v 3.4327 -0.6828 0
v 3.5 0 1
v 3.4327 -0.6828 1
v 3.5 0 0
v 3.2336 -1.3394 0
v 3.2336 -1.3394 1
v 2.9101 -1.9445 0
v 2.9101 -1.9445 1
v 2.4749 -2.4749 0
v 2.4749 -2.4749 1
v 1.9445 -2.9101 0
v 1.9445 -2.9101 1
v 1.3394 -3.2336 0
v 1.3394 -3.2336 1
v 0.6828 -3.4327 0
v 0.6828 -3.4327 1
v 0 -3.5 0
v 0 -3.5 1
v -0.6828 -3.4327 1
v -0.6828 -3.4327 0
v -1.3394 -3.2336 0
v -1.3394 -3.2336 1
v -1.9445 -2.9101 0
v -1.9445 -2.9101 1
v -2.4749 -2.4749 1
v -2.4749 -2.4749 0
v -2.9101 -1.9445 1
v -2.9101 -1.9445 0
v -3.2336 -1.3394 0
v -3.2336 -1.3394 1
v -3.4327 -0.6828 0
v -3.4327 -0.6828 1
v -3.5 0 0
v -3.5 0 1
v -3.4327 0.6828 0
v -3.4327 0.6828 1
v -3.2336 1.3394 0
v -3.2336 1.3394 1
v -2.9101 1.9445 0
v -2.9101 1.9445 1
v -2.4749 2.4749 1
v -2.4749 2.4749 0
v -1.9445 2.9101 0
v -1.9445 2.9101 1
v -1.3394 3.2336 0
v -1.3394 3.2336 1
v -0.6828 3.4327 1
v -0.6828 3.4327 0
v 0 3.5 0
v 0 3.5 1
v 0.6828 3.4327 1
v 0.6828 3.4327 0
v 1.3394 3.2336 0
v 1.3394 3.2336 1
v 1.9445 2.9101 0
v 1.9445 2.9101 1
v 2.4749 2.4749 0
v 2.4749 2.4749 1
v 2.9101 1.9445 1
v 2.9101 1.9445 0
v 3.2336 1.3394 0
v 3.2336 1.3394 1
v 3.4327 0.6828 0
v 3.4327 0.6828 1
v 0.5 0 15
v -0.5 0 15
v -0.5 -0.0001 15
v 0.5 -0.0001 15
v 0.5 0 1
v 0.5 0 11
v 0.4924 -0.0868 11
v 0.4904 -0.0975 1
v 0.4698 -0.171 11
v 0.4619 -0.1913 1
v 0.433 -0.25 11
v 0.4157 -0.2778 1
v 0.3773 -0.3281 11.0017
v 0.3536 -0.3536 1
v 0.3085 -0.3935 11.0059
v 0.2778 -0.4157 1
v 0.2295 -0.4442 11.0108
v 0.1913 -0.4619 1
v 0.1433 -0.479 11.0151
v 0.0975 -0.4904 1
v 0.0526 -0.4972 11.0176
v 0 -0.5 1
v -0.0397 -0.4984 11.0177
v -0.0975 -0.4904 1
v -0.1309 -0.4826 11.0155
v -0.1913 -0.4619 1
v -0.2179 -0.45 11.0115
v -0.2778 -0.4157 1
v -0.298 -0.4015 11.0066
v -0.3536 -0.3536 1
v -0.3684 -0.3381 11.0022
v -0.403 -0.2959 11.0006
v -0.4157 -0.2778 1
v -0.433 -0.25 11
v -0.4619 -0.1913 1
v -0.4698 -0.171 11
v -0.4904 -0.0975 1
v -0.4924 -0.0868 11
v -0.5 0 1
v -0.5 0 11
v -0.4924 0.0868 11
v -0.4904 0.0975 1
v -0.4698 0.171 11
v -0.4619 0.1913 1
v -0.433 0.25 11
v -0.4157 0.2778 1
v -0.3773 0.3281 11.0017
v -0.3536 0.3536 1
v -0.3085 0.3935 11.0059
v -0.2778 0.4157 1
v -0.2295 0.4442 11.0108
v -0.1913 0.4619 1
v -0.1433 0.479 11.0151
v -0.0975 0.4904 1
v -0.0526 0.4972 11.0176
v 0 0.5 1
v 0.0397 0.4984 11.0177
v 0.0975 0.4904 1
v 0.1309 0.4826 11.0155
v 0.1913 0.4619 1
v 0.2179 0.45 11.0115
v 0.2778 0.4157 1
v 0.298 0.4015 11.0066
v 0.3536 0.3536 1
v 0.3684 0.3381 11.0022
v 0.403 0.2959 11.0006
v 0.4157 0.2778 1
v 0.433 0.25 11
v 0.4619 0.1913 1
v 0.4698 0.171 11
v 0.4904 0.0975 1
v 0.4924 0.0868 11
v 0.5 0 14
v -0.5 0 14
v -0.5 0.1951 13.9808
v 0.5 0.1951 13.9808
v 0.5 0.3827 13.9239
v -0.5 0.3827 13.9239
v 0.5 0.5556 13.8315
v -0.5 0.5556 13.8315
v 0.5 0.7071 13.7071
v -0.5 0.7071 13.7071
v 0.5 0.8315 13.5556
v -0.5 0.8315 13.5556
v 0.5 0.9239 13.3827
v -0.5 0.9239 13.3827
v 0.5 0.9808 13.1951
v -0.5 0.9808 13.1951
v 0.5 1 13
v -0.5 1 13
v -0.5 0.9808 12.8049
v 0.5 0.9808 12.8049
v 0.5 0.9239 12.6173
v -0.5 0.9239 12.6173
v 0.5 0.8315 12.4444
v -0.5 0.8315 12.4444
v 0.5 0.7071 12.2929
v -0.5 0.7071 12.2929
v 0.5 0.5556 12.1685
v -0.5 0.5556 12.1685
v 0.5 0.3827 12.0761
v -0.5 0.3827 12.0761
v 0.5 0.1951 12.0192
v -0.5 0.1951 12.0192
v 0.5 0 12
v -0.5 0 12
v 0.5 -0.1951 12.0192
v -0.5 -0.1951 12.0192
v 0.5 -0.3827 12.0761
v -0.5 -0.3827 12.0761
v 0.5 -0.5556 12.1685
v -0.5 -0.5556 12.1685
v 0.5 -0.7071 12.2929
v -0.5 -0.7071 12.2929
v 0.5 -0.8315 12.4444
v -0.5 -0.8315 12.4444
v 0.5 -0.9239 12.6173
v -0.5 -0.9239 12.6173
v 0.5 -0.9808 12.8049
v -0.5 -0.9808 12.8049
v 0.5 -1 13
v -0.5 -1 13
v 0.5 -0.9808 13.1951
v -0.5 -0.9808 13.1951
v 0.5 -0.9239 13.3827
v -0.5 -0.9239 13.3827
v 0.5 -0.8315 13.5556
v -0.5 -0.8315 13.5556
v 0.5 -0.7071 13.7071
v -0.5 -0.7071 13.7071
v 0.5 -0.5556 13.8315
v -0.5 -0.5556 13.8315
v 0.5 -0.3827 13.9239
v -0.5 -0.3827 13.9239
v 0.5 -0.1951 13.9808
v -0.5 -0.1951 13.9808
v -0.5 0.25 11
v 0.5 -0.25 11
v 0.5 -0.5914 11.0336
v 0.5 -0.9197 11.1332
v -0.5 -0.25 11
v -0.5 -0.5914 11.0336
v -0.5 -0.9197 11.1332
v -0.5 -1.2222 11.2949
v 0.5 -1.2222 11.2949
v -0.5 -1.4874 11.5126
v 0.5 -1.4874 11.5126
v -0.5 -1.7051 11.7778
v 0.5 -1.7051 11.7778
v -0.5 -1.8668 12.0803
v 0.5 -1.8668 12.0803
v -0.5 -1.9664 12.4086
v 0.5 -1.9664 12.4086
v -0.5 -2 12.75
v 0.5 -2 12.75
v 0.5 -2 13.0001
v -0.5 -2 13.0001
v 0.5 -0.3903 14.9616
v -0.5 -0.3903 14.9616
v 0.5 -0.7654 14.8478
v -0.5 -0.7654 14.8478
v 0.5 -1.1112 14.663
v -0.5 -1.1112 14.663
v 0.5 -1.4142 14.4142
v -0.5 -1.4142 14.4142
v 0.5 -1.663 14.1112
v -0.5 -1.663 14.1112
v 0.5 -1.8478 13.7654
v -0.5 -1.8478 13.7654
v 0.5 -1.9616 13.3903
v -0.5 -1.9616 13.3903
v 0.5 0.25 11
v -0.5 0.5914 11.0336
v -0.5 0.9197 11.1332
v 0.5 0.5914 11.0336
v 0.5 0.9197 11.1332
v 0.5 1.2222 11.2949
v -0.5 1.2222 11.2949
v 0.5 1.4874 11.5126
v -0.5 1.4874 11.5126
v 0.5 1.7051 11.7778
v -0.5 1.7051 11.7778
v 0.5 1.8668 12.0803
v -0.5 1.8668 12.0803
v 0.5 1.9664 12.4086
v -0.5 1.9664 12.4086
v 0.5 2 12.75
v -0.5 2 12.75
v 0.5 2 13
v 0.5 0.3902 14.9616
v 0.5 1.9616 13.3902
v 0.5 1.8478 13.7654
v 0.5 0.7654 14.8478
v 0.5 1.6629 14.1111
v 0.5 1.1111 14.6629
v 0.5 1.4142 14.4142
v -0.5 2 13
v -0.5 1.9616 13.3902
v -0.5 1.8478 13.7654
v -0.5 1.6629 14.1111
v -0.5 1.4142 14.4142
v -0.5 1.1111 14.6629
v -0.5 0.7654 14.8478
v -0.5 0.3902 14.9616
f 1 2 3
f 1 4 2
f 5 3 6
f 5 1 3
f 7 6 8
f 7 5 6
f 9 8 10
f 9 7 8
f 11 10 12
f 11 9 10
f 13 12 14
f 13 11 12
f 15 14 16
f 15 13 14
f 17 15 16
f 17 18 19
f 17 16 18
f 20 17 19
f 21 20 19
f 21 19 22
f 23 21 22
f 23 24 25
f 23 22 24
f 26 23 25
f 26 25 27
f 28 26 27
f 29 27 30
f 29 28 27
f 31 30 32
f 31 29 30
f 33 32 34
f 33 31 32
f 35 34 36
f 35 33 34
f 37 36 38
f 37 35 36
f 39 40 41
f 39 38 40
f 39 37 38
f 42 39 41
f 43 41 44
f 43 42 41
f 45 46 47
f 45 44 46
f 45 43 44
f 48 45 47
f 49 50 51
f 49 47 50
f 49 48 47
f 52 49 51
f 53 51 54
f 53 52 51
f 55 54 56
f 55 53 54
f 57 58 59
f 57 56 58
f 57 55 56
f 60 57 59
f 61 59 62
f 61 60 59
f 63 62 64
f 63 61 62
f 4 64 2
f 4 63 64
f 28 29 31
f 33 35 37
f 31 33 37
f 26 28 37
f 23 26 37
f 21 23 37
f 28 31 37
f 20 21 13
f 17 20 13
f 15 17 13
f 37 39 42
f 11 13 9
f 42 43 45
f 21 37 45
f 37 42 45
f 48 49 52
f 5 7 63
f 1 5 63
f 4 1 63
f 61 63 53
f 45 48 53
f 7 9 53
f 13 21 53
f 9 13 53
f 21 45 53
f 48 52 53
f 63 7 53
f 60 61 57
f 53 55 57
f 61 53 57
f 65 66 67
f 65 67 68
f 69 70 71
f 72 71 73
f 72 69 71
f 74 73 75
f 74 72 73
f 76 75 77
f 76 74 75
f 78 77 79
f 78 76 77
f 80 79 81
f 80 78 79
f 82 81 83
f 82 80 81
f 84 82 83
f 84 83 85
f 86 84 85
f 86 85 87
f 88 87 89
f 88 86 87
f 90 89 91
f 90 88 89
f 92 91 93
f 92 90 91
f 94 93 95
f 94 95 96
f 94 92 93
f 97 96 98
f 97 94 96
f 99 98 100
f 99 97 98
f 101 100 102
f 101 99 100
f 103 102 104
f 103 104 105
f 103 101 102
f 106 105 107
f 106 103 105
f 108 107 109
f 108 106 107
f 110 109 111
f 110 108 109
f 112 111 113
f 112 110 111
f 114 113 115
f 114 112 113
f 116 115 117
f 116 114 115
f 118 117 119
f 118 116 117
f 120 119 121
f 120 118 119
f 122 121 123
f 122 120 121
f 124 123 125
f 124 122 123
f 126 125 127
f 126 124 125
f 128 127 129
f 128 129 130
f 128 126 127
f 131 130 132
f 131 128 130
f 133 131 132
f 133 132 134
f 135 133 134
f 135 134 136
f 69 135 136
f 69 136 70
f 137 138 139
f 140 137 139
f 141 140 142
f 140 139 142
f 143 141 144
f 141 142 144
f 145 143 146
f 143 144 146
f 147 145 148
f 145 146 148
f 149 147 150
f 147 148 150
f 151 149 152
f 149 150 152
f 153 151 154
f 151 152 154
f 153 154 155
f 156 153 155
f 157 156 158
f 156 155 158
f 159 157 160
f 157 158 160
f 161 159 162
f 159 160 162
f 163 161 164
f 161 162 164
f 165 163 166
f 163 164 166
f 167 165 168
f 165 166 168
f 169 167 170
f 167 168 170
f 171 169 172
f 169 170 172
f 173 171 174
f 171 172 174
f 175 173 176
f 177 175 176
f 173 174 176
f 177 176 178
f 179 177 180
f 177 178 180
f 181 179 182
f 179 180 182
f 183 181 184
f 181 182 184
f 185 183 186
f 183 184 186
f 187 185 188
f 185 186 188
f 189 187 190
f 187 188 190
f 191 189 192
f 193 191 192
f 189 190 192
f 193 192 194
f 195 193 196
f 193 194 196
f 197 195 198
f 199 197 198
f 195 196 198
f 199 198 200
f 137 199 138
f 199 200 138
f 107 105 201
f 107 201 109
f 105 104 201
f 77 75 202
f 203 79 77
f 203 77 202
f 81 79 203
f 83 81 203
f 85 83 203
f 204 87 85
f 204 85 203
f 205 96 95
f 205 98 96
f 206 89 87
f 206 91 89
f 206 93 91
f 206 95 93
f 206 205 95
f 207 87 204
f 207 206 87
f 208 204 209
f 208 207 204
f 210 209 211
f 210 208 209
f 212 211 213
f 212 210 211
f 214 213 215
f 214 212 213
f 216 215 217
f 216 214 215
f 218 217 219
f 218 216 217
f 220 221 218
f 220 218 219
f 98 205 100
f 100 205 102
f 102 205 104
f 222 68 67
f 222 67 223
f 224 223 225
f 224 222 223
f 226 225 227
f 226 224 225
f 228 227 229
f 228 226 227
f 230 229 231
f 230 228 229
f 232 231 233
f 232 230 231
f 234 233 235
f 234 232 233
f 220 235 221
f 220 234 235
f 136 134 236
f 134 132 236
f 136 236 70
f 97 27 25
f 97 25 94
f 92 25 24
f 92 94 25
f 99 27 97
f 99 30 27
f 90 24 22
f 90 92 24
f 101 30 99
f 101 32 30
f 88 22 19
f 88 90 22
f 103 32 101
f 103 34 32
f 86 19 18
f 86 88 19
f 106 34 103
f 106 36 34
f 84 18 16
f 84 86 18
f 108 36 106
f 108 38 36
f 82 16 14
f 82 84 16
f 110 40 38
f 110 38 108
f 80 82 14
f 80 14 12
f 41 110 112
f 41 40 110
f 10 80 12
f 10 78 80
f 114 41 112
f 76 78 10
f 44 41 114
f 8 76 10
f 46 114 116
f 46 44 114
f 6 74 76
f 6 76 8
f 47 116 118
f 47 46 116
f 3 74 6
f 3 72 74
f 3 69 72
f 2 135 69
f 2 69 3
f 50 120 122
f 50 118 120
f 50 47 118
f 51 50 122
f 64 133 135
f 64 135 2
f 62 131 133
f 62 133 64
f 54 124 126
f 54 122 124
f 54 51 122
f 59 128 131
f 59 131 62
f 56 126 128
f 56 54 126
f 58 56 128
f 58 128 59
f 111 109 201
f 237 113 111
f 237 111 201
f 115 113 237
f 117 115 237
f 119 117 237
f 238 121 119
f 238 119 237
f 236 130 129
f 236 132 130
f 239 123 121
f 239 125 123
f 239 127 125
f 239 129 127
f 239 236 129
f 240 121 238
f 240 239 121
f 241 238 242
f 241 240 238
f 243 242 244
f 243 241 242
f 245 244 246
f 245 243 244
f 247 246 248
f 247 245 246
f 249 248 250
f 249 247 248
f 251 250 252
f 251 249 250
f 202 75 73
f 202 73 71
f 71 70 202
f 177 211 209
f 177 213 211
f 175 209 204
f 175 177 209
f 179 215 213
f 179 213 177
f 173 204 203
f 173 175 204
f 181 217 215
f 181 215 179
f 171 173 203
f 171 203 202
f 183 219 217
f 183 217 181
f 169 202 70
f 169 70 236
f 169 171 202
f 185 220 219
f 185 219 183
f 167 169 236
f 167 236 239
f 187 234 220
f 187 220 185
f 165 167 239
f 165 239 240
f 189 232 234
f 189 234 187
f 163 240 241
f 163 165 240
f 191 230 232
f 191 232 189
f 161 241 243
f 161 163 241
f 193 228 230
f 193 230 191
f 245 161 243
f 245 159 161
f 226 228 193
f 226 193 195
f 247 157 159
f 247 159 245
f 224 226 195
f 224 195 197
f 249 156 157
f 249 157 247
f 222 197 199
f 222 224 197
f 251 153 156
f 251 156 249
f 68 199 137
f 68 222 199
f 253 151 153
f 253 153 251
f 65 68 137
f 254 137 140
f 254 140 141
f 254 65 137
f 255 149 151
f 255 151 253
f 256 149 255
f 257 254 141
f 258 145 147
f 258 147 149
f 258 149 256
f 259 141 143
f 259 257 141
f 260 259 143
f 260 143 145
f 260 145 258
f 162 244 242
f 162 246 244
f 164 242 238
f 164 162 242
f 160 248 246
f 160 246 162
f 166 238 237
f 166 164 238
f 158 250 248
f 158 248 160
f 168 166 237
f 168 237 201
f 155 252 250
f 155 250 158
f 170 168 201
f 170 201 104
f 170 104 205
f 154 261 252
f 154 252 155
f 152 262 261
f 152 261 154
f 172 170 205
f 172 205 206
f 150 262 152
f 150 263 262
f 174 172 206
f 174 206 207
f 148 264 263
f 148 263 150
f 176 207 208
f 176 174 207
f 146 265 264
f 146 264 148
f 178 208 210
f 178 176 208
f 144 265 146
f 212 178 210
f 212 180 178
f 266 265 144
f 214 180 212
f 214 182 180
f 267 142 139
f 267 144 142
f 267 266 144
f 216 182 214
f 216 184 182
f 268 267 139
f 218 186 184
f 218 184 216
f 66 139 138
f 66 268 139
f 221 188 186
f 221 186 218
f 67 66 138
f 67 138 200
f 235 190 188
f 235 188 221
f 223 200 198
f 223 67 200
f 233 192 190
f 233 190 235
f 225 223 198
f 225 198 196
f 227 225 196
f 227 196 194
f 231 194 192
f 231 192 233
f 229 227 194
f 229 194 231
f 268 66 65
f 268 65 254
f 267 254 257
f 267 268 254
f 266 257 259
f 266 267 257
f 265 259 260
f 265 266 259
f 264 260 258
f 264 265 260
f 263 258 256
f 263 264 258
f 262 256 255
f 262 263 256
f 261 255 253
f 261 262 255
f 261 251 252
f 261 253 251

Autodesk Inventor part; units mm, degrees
ref_plane "YZ Plane" through (0, 0, 0) normal (1, 0, 0) x (0, 1, 0)
ref_plane "XZ Plane" through (0, 0, 0) normal (0, 1, 0) x (-1, 0, 0)
ref_plane "XY Plane" through (0, 0, 0) normal (0, 0, 1) x (1, 0, 0)
sketch "Skizze1" plane through (0, 0, 0) normal (0, 0, 1) x (1, 0, 0)
  circle A0 centre (0, 0) radius 3.5
  dimension "d0" = 7
extrude "Extrusion1" add sketch "Skizze1" along normal blind 1
sketch "Skizze2" plane through (0, 0, 1) normal (0, 0, 1) x (1, 0, 0)
  circle A0 centre (0, 0) radius 0.5
  dimension "d3" = 1
extrude "Extrusion2" add sketch "Skizze2" along normal blind 14
sketch "Skizze4" plane through (0, 0, 15) normal (0, 0, 1) x (1, 0, 0)
  line L0 (-0.5, -2) -> (0.5, -2)
  line L1 (0.5, -2) -> (0.5, 2)
  line L2 (0.5, 2) -> (-0.5, 2)
  line L3 (-0.5, 2) -> (-0.5, -2)
  circle A0 centre (0, 0) radius 0.5 projected
  dimension "d25" = 1
  dimension "d26" = 4
  dimension "d27" = 2
extrude "Extrusion4" add sketch "Skizze4" against normal blind 4 contours L3 A0 L1 L0 | L3 L2 L1 A0
sketch "Skizze6" plane through (-0.5, -2, 15) normal (-1, 0, 0) x (0, 0, 1)
  circle A0 centre (-2, 2) radius 1
  line L0 (0, 4) -> (-4, 4) projected
  line L1 (0, 4) -> (0, 0) projected
  point P0 (-15, 2)
  dimension "d31" = 2
  dimension "d32" = 2
  dimension "d33" = 2
extrude "Extrusion5" cut sketch "Skizze6" against normal blind 1
sketch "Skizze10" plane through (-0.5, -2, 15) normal (-1, 0, 0) x (0, 0, 1)
  point P0 (-15, 2)
fillet "Rundung9" radius 2 1 edges at (0, 2, 15)
fillet "Rundung10" radius 2 1 edges at (0, -2, 15)
fillet "Rundung11" radius 1.75 1 edges at (0, -2, 11)
fillet "Rundung12" radius 1.75 1 edges at (0, 2, 11)
properties part number "Pneumatickolben_Kolbenkreis"
